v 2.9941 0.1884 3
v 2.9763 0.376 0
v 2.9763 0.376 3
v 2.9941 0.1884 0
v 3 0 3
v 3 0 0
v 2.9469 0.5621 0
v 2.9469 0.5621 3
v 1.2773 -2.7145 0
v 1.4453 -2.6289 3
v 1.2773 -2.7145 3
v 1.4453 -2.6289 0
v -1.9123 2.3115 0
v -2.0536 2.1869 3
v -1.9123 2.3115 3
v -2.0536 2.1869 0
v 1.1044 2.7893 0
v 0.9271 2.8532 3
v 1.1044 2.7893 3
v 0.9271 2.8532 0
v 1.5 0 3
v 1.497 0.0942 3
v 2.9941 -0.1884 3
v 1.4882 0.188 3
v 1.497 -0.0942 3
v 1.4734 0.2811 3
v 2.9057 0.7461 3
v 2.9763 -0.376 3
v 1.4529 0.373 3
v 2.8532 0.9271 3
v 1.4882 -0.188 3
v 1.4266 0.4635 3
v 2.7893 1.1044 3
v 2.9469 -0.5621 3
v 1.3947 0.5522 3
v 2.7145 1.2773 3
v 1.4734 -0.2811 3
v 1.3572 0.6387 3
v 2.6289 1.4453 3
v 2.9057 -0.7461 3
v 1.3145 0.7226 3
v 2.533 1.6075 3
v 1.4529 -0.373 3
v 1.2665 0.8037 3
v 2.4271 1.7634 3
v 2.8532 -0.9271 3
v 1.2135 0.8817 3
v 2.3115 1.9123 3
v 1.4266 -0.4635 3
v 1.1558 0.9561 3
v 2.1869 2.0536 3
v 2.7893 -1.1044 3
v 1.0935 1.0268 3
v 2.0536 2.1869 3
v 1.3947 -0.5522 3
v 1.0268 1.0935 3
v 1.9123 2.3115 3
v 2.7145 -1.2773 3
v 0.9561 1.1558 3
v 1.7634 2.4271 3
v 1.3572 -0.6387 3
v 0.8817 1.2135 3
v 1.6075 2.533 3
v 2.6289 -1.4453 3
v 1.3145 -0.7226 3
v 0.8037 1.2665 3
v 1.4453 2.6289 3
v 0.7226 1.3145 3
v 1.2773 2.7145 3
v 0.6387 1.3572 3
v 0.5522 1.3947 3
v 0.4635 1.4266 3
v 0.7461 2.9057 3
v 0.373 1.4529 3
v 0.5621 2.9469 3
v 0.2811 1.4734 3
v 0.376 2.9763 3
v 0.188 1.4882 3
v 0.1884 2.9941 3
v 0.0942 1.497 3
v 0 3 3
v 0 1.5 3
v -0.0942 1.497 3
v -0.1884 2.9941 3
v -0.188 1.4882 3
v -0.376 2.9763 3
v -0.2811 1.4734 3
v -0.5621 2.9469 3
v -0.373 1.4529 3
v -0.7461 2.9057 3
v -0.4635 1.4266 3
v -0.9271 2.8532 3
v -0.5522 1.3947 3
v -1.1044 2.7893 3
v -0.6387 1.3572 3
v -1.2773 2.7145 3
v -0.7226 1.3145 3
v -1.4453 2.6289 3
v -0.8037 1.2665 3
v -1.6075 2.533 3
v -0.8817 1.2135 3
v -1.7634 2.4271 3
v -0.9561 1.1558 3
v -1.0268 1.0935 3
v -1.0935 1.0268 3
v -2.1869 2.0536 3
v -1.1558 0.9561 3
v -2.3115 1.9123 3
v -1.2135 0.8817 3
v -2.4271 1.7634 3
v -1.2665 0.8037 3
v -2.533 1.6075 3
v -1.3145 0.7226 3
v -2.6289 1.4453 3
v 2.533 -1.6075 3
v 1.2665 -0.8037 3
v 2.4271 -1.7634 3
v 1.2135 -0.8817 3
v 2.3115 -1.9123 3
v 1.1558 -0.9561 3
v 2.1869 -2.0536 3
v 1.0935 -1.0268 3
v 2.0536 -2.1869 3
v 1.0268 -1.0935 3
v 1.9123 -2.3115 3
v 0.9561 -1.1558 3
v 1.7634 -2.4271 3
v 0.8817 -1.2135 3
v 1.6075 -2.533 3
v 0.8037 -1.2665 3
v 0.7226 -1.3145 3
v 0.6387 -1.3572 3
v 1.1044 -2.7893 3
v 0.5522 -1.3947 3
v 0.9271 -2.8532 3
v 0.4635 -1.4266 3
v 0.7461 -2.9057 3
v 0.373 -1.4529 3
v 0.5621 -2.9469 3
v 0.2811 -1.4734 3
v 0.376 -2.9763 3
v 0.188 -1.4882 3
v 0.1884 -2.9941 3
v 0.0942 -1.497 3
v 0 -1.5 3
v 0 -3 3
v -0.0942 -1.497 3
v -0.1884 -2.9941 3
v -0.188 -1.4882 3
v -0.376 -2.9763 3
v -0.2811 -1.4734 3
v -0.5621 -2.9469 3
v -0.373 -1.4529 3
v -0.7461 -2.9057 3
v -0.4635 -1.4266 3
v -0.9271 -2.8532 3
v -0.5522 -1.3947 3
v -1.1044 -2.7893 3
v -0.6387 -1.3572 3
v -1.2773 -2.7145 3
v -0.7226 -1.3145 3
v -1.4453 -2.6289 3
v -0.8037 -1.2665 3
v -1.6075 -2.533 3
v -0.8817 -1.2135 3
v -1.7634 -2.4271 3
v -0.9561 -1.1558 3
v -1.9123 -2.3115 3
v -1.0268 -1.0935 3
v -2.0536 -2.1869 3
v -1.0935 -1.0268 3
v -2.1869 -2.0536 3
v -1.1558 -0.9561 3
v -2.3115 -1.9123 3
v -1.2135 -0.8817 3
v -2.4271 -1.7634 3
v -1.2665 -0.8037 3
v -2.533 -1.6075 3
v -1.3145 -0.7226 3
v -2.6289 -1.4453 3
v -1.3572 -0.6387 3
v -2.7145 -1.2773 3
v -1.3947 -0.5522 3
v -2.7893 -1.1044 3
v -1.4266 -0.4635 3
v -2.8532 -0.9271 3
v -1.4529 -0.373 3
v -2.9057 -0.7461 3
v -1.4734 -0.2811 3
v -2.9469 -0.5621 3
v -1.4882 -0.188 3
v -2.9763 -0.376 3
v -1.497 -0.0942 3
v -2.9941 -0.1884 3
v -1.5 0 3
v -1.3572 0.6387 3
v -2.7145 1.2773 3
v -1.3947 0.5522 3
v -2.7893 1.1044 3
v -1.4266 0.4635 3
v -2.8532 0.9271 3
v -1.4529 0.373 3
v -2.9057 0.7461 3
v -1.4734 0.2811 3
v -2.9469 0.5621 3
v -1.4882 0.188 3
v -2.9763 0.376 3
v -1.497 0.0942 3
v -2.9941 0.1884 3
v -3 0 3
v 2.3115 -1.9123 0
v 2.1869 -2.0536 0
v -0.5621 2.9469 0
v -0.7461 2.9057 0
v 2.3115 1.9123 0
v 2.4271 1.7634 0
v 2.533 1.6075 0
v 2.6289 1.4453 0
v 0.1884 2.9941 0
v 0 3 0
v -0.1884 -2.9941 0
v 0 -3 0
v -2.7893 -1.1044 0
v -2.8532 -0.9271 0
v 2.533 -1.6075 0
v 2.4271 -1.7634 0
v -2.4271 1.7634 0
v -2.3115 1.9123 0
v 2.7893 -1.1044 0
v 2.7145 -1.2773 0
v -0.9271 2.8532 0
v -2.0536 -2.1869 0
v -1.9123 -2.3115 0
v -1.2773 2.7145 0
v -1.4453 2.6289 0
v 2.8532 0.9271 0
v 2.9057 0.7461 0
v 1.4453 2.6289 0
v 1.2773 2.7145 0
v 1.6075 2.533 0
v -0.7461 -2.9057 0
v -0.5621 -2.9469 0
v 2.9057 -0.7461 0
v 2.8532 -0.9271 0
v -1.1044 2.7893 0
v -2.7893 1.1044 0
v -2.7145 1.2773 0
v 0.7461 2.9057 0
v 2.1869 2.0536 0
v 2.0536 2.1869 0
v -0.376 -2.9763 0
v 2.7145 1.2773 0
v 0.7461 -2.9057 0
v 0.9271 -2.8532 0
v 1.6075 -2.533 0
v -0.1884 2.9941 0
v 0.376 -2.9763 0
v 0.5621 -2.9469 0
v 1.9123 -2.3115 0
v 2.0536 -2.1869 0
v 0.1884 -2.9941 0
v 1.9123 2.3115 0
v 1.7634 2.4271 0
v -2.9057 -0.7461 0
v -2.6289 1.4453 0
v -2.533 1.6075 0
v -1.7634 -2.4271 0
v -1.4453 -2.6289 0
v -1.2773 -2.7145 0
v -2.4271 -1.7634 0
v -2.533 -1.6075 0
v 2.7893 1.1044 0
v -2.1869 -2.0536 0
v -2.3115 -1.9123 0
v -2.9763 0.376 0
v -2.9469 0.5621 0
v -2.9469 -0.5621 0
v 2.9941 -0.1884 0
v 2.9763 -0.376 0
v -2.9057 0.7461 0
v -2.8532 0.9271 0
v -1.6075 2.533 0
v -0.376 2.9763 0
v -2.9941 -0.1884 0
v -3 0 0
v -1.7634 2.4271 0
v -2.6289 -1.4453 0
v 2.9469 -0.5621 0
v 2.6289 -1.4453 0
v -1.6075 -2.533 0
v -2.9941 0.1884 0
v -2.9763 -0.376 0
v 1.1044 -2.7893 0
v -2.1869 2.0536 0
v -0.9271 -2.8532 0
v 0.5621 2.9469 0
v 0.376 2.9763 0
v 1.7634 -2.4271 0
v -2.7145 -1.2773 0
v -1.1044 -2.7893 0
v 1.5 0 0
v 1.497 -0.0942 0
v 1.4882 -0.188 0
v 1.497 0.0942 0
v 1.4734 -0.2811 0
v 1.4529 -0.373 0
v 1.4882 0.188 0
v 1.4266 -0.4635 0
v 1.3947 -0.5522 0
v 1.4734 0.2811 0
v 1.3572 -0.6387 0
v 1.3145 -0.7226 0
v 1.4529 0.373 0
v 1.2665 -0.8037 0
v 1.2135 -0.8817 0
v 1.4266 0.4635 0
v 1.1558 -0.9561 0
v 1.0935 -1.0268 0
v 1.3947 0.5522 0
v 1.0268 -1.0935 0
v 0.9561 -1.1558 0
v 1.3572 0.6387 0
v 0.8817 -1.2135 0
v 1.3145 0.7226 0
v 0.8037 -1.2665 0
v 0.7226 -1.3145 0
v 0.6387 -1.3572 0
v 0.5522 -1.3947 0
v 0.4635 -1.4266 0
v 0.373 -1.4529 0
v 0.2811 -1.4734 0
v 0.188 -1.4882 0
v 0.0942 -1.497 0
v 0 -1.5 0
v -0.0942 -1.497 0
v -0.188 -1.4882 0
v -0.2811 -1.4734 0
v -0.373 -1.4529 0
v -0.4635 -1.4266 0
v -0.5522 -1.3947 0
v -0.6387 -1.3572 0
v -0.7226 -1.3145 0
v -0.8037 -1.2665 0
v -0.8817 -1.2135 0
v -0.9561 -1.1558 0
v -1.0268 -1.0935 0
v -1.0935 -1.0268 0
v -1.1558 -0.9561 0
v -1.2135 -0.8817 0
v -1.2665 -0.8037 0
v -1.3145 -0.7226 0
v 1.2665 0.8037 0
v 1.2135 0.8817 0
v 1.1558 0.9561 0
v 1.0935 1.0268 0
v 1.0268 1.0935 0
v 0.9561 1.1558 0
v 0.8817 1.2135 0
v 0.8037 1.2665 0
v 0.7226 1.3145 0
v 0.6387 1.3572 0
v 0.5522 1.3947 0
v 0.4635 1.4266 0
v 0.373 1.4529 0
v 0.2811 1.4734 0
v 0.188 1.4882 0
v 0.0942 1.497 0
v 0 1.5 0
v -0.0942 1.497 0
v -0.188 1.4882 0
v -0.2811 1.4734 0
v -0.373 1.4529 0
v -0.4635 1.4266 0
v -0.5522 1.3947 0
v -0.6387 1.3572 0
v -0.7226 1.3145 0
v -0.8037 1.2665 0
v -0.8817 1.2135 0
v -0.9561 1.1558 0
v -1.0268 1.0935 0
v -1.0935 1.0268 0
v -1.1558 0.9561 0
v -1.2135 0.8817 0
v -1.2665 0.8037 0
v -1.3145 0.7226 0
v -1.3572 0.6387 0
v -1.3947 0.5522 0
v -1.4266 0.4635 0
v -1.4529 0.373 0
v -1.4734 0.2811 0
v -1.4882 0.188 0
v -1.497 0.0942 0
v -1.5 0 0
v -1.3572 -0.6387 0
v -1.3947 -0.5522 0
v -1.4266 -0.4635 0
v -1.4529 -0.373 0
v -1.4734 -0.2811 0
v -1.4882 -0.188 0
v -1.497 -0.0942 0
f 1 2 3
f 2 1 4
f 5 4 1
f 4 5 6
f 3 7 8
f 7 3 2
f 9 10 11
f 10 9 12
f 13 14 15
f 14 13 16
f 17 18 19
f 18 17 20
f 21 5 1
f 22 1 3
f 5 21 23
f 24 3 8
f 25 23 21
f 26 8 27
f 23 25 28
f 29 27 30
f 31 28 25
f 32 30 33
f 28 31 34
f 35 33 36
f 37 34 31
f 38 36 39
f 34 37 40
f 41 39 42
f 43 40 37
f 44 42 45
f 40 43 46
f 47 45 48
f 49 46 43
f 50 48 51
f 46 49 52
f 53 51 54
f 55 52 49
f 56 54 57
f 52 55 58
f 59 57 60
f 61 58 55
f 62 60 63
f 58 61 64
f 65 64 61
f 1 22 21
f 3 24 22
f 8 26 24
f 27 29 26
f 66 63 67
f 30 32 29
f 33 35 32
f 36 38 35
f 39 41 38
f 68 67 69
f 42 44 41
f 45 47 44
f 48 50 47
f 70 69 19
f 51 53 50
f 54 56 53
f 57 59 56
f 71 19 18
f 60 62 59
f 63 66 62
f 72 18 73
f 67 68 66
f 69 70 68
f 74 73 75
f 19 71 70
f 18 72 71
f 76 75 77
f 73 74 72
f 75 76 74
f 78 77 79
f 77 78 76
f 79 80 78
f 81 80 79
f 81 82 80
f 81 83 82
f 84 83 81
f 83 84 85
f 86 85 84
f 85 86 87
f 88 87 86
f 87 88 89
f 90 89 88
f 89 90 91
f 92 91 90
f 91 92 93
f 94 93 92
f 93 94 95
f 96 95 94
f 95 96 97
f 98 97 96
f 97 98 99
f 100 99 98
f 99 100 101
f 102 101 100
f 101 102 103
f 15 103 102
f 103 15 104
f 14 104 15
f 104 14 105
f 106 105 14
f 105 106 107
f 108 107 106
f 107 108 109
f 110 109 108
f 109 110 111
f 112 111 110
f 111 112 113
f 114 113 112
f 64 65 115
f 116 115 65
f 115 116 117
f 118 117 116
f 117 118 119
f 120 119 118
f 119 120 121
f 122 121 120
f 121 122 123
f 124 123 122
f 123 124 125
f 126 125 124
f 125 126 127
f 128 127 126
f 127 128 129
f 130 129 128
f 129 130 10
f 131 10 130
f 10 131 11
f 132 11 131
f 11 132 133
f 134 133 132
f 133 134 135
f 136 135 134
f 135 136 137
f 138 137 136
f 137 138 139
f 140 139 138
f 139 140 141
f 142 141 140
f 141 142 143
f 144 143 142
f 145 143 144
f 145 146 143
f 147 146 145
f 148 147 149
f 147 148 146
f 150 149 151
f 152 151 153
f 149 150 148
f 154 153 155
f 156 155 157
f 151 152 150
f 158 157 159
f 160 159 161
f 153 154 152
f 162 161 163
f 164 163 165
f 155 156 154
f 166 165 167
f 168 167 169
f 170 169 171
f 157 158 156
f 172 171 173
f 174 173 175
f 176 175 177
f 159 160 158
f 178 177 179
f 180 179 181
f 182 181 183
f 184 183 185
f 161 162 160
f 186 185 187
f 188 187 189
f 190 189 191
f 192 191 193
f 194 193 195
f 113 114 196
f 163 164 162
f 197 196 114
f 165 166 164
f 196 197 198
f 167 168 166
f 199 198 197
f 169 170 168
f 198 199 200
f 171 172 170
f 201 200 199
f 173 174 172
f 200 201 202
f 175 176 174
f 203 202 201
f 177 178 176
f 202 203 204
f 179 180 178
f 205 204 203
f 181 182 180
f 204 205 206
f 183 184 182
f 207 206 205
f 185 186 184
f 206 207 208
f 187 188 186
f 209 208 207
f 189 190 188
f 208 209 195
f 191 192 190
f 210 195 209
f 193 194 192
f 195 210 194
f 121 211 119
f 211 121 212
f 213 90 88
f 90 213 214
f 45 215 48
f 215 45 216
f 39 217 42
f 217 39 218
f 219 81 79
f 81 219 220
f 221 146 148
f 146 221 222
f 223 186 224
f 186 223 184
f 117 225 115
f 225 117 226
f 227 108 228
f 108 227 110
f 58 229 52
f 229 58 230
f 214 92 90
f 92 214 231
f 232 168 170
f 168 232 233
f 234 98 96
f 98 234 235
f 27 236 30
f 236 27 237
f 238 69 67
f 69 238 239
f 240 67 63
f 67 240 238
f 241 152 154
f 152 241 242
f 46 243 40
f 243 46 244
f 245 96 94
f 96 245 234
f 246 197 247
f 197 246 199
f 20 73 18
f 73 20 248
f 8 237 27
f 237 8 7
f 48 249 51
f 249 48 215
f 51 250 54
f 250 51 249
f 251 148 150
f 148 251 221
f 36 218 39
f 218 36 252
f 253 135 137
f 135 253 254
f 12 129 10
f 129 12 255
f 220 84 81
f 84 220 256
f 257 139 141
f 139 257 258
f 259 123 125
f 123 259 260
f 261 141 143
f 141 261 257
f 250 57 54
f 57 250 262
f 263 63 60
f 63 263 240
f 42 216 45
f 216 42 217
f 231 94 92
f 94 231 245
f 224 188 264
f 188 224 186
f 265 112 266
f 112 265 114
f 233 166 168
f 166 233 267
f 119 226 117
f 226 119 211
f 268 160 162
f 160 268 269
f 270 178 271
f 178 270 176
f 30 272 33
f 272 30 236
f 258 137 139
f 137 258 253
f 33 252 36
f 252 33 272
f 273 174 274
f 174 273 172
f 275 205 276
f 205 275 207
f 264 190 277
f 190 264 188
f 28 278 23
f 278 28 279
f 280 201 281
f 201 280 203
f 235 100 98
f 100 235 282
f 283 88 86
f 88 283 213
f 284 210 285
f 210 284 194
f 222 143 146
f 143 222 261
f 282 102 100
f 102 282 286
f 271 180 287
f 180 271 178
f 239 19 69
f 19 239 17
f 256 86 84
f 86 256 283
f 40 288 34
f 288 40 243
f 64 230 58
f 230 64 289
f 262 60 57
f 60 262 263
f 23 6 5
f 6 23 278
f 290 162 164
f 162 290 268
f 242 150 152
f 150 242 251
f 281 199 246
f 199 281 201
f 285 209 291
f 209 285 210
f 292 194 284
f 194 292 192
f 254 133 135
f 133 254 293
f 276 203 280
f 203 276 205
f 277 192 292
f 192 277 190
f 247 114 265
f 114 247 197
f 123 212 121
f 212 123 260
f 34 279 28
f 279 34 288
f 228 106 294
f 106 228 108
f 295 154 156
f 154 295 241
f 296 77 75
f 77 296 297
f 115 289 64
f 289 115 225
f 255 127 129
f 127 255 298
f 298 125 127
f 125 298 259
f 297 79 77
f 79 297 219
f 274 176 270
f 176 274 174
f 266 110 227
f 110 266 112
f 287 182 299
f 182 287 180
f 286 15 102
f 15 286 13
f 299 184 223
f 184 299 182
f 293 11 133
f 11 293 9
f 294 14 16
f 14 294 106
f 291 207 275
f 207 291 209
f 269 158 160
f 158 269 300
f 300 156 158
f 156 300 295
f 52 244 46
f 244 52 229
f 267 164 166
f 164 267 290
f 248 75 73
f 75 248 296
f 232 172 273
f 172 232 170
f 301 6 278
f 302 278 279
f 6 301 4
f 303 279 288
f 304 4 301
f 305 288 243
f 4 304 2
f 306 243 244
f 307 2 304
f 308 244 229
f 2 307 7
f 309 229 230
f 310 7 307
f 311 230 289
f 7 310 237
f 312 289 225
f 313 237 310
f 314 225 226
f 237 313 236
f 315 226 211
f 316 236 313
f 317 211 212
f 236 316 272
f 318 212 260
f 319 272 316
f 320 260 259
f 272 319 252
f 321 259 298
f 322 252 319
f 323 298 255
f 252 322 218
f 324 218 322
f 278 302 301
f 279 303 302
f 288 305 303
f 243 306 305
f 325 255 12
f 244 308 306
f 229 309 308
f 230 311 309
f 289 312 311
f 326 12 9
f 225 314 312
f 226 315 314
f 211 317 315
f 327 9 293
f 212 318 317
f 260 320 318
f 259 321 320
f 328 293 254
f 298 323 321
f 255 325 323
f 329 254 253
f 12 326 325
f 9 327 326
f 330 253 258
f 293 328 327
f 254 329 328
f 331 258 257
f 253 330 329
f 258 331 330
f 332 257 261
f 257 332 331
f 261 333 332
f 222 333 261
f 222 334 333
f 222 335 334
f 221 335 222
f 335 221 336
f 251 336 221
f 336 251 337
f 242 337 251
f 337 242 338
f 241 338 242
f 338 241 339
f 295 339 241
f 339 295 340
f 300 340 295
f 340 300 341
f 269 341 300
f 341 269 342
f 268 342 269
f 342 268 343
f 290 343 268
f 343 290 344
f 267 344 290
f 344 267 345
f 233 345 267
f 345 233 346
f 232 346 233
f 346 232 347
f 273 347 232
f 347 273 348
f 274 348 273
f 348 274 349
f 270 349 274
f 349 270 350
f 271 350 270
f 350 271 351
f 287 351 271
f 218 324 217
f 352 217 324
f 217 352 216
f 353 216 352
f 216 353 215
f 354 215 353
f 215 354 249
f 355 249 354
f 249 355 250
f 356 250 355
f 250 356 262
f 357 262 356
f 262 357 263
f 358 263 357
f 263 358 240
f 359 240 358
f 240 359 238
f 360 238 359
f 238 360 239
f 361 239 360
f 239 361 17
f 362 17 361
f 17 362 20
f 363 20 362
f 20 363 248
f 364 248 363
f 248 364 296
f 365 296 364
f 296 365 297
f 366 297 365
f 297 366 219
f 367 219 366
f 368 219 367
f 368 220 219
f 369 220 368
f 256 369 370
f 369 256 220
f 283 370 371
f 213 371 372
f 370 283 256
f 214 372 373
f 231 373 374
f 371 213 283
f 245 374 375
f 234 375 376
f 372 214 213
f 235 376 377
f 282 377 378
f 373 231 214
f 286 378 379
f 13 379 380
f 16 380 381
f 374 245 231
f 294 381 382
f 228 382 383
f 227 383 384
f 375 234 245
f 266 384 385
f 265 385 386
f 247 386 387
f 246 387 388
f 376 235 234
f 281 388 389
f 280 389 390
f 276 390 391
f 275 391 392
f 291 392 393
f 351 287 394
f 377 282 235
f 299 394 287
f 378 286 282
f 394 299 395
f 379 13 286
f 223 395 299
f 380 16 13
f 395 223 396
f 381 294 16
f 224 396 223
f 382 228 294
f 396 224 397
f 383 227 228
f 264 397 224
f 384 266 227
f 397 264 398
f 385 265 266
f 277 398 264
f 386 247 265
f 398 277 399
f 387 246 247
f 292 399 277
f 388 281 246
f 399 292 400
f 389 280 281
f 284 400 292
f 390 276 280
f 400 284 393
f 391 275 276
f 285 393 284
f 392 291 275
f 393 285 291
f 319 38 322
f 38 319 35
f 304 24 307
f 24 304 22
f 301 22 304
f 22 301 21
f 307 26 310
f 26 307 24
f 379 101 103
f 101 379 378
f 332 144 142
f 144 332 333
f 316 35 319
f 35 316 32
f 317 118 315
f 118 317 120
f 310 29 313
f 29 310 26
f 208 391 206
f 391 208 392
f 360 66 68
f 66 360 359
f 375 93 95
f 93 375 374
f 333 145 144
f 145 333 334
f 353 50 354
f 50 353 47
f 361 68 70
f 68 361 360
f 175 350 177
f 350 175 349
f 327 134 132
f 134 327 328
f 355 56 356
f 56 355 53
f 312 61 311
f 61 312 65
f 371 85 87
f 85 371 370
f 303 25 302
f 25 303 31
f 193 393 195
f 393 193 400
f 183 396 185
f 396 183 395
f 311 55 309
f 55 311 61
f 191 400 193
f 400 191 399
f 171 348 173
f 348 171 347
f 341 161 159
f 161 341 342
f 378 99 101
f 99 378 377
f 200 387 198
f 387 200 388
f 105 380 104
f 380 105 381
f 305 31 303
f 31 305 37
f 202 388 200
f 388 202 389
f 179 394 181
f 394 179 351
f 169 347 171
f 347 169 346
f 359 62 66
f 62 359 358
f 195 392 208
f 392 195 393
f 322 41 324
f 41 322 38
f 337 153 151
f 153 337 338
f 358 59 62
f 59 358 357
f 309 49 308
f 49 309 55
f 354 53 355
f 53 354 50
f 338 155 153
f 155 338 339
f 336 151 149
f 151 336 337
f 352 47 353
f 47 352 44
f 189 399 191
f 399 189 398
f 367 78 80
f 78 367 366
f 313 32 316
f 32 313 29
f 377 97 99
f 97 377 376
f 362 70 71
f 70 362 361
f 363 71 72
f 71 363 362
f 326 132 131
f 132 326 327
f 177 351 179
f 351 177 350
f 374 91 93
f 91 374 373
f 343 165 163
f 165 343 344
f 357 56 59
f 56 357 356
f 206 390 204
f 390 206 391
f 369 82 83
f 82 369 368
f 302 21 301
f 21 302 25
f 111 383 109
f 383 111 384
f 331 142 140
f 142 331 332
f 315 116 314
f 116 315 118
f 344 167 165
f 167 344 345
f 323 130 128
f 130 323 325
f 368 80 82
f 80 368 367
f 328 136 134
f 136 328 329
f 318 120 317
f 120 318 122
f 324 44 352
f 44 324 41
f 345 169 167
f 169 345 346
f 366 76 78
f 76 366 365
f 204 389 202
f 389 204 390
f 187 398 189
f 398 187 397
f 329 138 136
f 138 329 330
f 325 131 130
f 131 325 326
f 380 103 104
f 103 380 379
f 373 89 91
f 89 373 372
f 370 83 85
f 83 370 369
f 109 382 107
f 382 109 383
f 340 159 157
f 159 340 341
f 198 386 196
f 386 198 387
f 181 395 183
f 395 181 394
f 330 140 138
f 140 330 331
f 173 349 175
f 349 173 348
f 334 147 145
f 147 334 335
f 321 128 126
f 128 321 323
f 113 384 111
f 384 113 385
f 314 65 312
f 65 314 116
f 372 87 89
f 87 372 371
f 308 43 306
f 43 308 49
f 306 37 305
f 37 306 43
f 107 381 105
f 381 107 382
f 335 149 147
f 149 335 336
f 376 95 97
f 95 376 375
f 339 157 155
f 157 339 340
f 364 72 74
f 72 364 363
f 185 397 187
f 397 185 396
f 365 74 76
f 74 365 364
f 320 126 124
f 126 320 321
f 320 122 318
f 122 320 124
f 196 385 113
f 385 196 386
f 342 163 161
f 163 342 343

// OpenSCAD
$height = 3;
$fn = 100;
difference(){
	cylinder(r = 3, h = $height, center = false);
	cylinder(r = 1.5, h = $height, center = false);
}
